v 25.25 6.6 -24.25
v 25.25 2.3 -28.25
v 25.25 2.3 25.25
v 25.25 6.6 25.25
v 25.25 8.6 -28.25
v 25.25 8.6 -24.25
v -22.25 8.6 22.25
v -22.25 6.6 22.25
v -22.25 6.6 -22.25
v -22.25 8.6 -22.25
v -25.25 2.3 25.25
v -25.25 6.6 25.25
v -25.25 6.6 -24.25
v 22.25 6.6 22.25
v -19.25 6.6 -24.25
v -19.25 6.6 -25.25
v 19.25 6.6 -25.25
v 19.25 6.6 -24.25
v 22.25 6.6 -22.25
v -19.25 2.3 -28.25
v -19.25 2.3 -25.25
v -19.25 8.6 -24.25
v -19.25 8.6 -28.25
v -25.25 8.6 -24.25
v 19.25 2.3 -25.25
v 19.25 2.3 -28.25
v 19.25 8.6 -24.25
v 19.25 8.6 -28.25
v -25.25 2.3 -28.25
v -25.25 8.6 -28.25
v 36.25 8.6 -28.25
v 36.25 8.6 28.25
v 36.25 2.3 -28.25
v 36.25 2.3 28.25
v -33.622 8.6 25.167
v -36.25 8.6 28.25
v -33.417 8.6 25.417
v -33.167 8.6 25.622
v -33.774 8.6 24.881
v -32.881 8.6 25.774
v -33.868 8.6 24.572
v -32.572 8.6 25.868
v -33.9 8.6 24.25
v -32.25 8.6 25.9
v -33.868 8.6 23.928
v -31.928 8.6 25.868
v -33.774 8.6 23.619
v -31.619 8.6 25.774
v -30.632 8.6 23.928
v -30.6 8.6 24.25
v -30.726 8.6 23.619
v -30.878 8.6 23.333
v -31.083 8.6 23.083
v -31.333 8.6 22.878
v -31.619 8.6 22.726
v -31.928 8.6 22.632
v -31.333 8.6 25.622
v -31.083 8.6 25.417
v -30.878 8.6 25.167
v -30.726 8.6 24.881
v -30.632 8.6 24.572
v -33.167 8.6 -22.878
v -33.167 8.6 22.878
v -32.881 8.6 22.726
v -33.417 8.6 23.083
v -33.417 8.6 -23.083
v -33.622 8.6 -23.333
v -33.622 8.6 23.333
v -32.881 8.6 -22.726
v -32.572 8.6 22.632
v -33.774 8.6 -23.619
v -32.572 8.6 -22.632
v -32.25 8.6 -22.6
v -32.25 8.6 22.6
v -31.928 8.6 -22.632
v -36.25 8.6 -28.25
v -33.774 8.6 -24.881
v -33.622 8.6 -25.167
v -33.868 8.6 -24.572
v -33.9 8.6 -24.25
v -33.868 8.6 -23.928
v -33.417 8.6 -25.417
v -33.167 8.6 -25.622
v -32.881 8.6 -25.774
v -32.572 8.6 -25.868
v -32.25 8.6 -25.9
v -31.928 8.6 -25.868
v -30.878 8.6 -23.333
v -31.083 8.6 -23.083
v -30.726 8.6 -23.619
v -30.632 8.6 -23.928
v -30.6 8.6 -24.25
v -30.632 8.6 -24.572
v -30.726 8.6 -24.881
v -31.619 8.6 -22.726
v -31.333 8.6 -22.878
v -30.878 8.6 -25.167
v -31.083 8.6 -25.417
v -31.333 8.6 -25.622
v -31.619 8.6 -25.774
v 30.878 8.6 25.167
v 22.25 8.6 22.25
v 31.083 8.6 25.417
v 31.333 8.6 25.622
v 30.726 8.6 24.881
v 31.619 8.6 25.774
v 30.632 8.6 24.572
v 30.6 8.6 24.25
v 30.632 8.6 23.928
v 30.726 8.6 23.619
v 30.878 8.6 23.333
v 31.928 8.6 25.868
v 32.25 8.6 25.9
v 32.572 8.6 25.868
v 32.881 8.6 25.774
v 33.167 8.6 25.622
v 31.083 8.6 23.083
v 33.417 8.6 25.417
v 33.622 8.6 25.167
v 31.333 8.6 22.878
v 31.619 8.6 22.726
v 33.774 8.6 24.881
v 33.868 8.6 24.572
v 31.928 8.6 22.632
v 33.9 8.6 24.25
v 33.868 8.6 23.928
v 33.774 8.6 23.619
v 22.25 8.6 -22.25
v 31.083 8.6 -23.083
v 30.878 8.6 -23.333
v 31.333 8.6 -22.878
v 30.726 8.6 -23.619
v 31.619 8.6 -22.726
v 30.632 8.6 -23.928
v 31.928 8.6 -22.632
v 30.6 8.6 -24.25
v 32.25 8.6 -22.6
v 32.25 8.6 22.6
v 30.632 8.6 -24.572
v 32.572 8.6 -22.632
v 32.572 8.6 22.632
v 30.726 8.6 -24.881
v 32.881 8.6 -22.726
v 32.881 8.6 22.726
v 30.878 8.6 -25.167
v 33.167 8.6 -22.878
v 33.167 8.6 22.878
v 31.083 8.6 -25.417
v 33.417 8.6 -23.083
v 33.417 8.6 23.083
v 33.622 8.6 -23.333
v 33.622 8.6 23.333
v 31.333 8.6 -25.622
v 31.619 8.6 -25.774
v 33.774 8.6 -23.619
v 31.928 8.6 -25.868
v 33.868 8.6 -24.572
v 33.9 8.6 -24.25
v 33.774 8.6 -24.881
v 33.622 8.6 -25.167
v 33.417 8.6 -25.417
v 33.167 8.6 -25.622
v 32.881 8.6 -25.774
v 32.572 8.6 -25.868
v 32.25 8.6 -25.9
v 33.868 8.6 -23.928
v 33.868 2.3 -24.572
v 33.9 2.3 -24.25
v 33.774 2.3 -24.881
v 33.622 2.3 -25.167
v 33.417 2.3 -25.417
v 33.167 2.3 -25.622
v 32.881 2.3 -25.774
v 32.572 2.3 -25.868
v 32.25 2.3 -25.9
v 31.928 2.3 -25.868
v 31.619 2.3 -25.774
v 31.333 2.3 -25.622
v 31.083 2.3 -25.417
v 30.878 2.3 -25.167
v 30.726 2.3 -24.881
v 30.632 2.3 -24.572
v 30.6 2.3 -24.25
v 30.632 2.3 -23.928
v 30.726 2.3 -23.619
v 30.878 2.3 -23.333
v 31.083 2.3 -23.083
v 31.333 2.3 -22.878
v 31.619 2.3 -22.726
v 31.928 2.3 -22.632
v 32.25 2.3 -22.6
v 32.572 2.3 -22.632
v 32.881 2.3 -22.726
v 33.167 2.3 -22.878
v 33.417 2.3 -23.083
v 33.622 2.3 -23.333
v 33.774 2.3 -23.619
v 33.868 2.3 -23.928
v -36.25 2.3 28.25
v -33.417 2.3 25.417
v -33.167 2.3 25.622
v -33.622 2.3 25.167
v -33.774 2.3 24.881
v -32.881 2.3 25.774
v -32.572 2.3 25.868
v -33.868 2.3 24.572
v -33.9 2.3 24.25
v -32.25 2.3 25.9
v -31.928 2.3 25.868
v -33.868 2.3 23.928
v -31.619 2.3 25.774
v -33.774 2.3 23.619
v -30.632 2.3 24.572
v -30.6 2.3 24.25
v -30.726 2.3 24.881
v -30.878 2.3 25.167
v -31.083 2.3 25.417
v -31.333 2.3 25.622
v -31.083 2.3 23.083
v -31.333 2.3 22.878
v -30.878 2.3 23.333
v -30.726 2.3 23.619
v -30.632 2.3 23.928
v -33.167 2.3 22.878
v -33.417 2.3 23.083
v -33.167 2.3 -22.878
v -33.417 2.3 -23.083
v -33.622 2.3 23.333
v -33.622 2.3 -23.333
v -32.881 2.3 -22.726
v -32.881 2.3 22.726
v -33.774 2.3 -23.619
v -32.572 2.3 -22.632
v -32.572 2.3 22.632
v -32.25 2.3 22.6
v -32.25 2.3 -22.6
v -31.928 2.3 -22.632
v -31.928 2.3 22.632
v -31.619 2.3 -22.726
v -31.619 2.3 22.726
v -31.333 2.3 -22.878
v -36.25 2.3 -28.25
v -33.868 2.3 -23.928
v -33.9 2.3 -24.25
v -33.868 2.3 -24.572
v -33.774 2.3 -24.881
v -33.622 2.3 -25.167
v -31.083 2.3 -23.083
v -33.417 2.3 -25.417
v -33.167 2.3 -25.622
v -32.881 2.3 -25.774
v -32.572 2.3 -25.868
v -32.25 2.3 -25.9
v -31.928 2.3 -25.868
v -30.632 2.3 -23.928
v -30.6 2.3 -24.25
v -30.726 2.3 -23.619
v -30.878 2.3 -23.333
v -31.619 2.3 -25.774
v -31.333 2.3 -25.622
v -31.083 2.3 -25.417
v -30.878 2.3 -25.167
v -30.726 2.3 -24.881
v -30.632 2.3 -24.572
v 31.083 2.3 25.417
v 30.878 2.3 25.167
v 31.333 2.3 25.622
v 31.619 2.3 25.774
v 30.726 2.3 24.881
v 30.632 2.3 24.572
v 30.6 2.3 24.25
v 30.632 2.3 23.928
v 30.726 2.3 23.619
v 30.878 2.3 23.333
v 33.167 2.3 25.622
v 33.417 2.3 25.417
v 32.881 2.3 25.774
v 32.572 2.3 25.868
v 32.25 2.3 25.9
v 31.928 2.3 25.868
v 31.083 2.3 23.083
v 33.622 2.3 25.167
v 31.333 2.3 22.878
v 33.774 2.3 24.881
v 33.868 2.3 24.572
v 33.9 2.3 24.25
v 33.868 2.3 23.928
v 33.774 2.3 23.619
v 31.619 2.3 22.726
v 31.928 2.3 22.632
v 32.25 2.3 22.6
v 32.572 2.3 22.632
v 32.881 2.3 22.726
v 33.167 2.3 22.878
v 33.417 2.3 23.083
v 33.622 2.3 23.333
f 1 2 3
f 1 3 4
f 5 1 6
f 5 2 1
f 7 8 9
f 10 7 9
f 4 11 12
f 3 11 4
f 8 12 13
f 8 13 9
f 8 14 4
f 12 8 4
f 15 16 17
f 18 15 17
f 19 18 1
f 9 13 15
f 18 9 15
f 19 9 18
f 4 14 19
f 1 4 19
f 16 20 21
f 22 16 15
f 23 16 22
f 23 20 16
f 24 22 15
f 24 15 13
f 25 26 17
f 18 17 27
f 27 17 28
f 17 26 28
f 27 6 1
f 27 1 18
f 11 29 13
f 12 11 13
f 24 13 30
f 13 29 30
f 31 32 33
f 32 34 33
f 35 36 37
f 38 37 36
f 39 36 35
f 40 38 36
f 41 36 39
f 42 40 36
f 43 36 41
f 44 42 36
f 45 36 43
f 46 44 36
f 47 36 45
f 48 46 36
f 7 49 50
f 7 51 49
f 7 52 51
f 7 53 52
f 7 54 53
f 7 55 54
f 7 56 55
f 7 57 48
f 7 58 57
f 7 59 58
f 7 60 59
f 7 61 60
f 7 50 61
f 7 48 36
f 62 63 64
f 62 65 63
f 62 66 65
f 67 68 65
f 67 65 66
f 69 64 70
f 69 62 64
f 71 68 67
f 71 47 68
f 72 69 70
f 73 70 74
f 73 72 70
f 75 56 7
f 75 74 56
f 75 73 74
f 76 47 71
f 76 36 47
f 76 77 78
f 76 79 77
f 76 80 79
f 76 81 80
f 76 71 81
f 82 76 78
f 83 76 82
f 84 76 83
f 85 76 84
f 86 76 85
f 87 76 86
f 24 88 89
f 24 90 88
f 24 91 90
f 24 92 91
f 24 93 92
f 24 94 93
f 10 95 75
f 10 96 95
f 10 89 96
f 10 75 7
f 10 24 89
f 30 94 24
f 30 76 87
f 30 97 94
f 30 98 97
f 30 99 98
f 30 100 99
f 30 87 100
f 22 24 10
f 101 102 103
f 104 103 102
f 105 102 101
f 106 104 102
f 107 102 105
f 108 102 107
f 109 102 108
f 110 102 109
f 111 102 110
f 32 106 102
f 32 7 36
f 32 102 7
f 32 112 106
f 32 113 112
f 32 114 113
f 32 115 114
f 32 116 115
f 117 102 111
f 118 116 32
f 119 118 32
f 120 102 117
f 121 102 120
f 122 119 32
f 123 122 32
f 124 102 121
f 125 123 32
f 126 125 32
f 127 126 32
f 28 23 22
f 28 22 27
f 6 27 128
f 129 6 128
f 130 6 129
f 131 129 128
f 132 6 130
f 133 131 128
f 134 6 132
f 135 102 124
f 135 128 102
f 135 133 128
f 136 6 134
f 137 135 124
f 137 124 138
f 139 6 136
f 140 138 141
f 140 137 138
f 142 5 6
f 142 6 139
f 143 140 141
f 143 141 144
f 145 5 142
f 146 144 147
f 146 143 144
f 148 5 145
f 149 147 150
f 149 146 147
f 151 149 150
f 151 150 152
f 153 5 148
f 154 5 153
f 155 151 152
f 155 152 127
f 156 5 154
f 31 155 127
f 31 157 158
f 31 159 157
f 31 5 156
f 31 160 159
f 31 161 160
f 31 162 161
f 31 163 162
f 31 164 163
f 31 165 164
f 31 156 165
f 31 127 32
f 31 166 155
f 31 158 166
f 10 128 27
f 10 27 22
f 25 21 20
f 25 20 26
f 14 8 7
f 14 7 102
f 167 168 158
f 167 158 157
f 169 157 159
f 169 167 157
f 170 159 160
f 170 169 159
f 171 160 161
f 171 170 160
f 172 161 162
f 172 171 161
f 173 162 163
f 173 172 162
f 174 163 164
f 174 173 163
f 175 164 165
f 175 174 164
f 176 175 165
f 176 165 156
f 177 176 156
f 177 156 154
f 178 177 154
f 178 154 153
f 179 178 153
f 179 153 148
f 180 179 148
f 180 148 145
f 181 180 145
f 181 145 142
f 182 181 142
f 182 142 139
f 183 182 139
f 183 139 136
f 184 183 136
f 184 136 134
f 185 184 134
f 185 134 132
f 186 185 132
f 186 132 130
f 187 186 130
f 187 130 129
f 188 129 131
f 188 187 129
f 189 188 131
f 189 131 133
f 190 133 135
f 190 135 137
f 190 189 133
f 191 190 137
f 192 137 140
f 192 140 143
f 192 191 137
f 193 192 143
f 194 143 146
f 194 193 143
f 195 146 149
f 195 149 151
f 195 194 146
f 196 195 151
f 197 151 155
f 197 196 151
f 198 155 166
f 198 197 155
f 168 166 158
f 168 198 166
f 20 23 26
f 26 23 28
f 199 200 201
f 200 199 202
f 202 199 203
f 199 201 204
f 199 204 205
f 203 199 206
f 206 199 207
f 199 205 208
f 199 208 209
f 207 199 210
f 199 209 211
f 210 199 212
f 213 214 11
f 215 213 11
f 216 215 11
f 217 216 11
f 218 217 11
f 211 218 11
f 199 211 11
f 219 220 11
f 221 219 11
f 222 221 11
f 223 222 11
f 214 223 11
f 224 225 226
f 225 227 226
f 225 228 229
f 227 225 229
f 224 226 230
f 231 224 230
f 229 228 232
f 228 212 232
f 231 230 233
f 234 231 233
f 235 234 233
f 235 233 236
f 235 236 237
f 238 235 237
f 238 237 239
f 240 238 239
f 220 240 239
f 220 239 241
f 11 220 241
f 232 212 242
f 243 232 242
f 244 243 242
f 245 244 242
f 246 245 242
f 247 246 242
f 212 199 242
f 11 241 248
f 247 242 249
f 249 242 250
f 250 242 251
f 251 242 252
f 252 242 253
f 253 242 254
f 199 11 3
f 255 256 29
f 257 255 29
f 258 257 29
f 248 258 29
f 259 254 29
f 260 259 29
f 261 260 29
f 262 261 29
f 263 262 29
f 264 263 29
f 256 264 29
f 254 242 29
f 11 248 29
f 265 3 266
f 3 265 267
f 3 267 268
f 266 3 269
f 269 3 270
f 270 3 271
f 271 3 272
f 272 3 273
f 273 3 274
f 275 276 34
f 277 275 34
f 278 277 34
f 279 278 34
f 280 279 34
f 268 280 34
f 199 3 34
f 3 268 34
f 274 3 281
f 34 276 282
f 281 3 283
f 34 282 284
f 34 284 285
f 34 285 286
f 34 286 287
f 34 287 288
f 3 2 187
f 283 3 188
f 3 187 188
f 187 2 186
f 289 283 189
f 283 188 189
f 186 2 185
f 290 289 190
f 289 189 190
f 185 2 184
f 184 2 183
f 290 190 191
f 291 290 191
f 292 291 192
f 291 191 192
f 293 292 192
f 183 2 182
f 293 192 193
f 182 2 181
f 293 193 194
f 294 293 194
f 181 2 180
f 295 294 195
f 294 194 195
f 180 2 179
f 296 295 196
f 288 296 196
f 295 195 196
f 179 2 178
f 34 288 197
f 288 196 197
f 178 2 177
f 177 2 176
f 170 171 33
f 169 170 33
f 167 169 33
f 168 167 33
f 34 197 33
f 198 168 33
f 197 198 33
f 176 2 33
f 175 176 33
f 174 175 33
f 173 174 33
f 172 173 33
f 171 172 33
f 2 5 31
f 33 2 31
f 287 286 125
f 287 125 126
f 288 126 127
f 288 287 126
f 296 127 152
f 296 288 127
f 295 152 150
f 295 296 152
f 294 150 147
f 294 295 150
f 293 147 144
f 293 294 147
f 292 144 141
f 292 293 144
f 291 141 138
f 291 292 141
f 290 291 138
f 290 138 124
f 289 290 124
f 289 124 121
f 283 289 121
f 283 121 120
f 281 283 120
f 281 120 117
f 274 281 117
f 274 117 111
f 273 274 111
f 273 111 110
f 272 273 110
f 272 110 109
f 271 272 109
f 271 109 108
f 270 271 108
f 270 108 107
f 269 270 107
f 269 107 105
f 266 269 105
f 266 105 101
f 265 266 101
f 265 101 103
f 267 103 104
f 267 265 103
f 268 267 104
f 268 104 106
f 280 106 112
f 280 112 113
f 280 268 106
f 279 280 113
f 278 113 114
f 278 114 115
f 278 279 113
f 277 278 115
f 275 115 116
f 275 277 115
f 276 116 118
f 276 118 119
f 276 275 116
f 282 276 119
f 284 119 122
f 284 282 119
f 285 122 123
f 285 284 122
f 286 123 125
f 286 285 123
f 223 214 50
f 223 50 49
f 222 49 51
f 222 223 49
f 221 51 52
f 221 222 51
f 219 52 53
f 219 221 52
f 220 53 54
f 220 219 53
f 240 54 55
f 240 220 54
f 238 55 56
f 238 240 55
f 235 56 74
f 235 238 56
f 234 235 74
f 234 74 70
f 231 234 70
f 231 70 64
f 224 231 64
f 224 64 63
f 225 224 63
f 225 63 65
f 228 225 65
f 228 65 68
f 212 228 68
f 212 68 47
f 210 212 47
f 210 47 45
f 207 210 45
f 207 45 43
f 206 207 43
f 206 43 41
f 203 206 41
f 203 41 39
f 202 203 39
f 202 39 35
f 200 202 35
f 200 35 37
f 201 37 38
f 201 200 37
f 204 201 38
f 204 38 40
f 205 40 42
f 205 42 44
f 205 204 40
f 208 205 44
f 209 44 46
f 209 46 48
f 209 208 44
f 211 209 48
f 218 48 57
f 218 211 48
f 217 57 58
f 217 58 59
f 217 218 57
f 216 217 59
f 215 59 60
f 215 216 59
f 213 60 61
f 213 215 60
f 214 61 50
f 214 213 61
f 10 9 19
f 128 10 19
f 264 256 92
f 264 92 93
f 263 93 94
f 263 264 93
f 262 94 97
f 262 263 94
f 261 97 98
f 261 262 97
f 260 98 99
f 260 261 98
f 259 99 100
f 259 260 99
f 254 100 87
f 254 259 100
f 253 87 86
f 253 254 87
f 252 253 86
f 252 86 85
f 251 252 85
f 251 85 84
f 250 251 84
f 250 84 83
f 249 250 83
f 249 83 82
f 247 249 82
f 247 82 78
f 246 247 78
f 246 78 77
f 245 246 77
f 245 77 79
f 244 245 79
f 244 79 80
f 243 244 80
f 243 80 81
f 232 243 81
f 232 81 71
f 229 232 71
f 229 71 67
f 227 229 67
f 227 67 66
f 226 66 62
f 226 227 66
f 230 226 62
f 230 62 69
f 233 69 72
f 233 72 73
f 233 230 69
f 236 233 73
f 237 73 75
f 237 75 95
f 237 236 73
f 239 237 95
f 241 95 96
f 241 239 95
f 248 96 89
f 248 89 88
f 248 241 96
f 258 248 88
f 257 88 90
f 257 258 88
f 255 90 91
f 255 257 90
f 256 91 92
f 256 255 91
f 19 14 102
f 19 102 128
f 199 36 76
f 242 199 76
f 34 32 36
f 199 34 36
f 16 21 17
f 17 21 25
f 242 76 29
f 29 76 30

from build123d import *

# Parameters (mm, degrees)
SKETCH1_W           = 56.5
SKETCH1_H           = 56.5
SKETCH1_W_2         = 50.5
SKETCH1_H_2         = 50.5
SKETCH1_R           = 1.65
BOSS_EXTRUDE1_DEPTH = 8.6
SKETCH2_W           = 50.5
SKETCH2_H           = 50.5
SKETCH2_W_2         = 44.5
SKETCH2_H_2         = 44.5
BOSS_EXTRUDE2_DEPTH = 2
BOSS_EXTRUDE3_START = 6.6
SKETCH4_W           = 50.5
SKETCH4_H           = 50.5
SKETCH4_W_2         = 44.5
SKETCH4_H_2         = 44.5
BOSS_EXTRUDE3_DEPTH = 2
CUT_EXTRUDE1_START  = 2
SKETCH5_W           = 6
SKETCH5_H           = 17.961455198
CUT_EXTRUDE1_DEPTH  = 4.6
SKETCH6_W           = 87.3205389
SKETCH6_H           = 82.15723747
CUT_EXTRUDE2_DEPTH  = 2.3
CUT_EXTRUDE4_DEPTH  = 10
SKETCH8_W           = 8
SKETCH8_H           = 40.5
BOSS_EXTRUDE4_DEPTH = 6.3
SKETCH9_W           = 6
SKETCH9_H           = 6.3
CUT_EXTRUDE5_DEPTH  = 4


with BuildPart() as part:
    # Sketch1 → Boss-Extrude1 (new body)
    with BuildSketch(Plane(origin=(0, 0, 0), x_dir=(1, 0, 0), z_dir=(0, 1, 0))):
        Rectangle(SKETCH1_W, SKETCH1_H)
        Rectangle(SKETCH1_W_2, SKETCH1_H_2, mode=Mode.SUBTRACT)
        Polygon((-28.25, -28.25), (-28.25, -12.25), (-36.25, -20.25), (-36.25, -30.25), (-32.25, -34.25), (-24.25, -34.25), (-18.25, -28.25), align=None)
        with Locations((-32.25, -24.25)):
            Circle(SKETCH1_R, mode=Mode.SUBTRACT)
        Polygon((28.25, -28.25), (18.25, -28.25), (24.25, -34.25), (32.25, -34.25), (36.25, -30.25), (36.25, -20.25), (28.25, -12.25), align=None)
        with Locations((32.25, -24.25)):
            Circle(SKETCH1_R, mode=Mode.SUBTRACT)
        Polygon((24.25, 34.25), (18.25, 28.25), (28.25, 28.25), (28.25, 12.25), (36.25, 20.25), (36.25, 30.25), (32.25, 34.25), align=None)
        with Locations((32.25, 24.25)):
            Circle(SKETCH1_R, mode=Mode.SUBTRACT)
        Polygon((-36.25, 20.25), (-28.25, 12.25), (-28.25, 28.25), (-18.25, 28.25), (-24.25, 34.25), (-32.25, 34.25), (-36.25, 30.25), align=None)
        with Locations((-32.25, 24.25)):
            Circle(SKETCH1_R, mode=Mode.SUBTRACT)
    extrude(amount=BOSS_EXTRUDE1_DEPTH)

    # Sketch2 → Boss-Extrude2 (add)
    with BuildSketch(Plane(origin=(0, 0, 0), x_dir=(1, 0, 0), z_dir=(0, 1, 0))):
        Rectangle(SKETCH2_W, SKETCH2_H)
        Rectangle(SKETCH2_W_2, SKETCH2_H_2, mode=Mode.SUBTRACT)
    extrude(amount=BOSS_EXTRUDE2_DEPTH)

    # Sketch4 → Boss-Extrude3 (add)
    with BuildSketch(Plane(origin=(0, 0, 0), x_dir=(1, 0, 0), z_dir=(0, 1, 0)).offset(BOSS_EXTRUDE3_START)):
        Rectangle(SKETCH4_W, SKETCH4_H)
        Rectangle(SKETCH4_W_2, SKETCH4_H_2, mode=Mode.SUBTRACT)
    extrude(amount=BOSS_EXTRUDE3_DEPTH)

    # Sketch5 → Cut-Extrude1 (cut)
    with BuildSketch(Plane(origin=(0, 0, 0), x_dir=(1, 0, 0), z_dir=(0, 1, 0)).offset(CUT_EXTRUDE1_START)):
        with Locations((-22.25, 28.869783692)):
            Rectangle(SKETCH5_W, SKETCH5_H)
        with Locations((22.25, 28.869783692)):
            Rectangle(SKETCH5_W, SKETCH5_H)
    extrude(amount=CUT_EXTRUDE1_DEPTH, mode=Mode.SUBTRACT)

    # Sketch6 → Cut-Extrude2 (cut)
    with BuildSketch(Plane.XZ):
        with Locations((1.898272585, -1.518618068)):
            Rectangle(SKETCH6_W, SKETCH6_H)
    extrude(amount=-CUT_EXTRUDE2_DEPTH, mode=Mode.SUBTRACT)

    # Sketch7 → Cut-Extrude4 (cut)
    with BuildSketch(Plane(origin=(0, 8.6, 0), x_dir=(1, 0, 0), z_dir=(0, 1, 0))):
        Polygon((-36.25, -30.25), (-36.25, -28.25), (-40.881768663, -28.25), (-40.881768663, -34.995320637), (0, -34.995320637), (0, -28.25), (-18.25, -28.25), (-24.25, -34.25), (-32.25, -34.25), align=None)
        Polygon((18.25, -28.25), (0, -28.25), (0, -34.995320637), (39.184342226, -34.995320637), (39.184342226, -28.25), (36.25, -28.25), (36.25, -30.25), (32.25, -34.25), (24.25, -34.25), align=None)
        Polygon((36.25, 20.25), (36.25, -20.25), (28.25, -12.25), (28.25, 12.25), align=None)
        Polygon((-36.25, 20.25), (-36.25, -20.25), (-28.25, -12.25), (-28.25, 12.25), align=None)
        Polygon((-36.25, 30.25), (-36.25, 28.25), (-18.25, 28.25), (-24.25, 34.25), (-32.25, 34.25), align=None)
        Polygon((-38.207606214, 28.25), (-36.25, 28.25), (-36.25, 30.25), (-32.25, 34.25), (-24.25, 34.25), (-18.25, 28.25), (0, 28.25), (0, 36.724555445), (-38.207606214, 36.724555445), align=None)
        Polygon((28.25, 12.25), (36.25, 20.25), (28.25, 20.25), align=None)
        Polygon((28.25, -20.25), (36.25, -20.25), (28.25, -12.25), align=None)
        Polygon((-18.25, -28.25), (-36.25, -28.25), (-36.25, -30.25), (-32.25, -34.25), (-24.25, -34.25), align=None)
        Polygon((-28.25, -12.25), (-36.25, -20.25), (-28.25, -20.25), align=None)
        Polygon((-28.25, 20.25), (-36.25, 20.25), (-28.25, 12.25), align=None)
        Polygon((24.25, 34.25), (18.25, 28.25), (36.25, 28.25), (36.25, 30.25), (32.25, 34.25), align=None)
        Polygon((0, 36.724555445), (0, 28.25), (18.25, 28.25), (24.25, 34.25), (32.25, 34.25), (36.25, 30.25), (36.25, 28.25), (40.981198071, 28.25), (40.981198071, 36.724555445), align=None)
        Polygon((36.25, -28.25), (18.25, -28.25), (24.25, -34.25), (32.25, -34.25), (36.25, -30.25), align=None)
    extrude(amount=-CUT_EXTRUDE4_DEPTH, mode=Mode.SUBTRACT)

    # Sketch8 → Boss-Extrude4 (add)
    with BuildSketch(Plane(origin=(0, 8.6, 0), x_dir=(1, 0, 0), z_dir=(0, 1, 0))):
        with Locations((-32.25, 0)):
            Rectangle(SKETCH8_W, SKETCH8_H)
        with Locations((32.25, 0)):
            Rectangle(SKETCH8_W, SKETCH8_H)
    extrude(amount=-BOSS_EXTRUDE4_DEPTH)

    # Sketch9 → Cut-Extrude5 (cut)
    with BuildSketch(Plane(origin=(0, 0, -28.25), x_dir=(-1, 0, 0), z_dir=(0, 0, -1))):
        with Locations((-22.25, 5.45)):
            Rectangle(SKETCH9_W, SKETCH9_H)
        with Locations((22.25, 5.45)):
            Rectangle(SKETCH9_W, SKETCH9_H)
    extrude(amount=-CUT_EXTRUDE5_DEPTH, mode=Mode.SUBTRACT)


solid = part.part
